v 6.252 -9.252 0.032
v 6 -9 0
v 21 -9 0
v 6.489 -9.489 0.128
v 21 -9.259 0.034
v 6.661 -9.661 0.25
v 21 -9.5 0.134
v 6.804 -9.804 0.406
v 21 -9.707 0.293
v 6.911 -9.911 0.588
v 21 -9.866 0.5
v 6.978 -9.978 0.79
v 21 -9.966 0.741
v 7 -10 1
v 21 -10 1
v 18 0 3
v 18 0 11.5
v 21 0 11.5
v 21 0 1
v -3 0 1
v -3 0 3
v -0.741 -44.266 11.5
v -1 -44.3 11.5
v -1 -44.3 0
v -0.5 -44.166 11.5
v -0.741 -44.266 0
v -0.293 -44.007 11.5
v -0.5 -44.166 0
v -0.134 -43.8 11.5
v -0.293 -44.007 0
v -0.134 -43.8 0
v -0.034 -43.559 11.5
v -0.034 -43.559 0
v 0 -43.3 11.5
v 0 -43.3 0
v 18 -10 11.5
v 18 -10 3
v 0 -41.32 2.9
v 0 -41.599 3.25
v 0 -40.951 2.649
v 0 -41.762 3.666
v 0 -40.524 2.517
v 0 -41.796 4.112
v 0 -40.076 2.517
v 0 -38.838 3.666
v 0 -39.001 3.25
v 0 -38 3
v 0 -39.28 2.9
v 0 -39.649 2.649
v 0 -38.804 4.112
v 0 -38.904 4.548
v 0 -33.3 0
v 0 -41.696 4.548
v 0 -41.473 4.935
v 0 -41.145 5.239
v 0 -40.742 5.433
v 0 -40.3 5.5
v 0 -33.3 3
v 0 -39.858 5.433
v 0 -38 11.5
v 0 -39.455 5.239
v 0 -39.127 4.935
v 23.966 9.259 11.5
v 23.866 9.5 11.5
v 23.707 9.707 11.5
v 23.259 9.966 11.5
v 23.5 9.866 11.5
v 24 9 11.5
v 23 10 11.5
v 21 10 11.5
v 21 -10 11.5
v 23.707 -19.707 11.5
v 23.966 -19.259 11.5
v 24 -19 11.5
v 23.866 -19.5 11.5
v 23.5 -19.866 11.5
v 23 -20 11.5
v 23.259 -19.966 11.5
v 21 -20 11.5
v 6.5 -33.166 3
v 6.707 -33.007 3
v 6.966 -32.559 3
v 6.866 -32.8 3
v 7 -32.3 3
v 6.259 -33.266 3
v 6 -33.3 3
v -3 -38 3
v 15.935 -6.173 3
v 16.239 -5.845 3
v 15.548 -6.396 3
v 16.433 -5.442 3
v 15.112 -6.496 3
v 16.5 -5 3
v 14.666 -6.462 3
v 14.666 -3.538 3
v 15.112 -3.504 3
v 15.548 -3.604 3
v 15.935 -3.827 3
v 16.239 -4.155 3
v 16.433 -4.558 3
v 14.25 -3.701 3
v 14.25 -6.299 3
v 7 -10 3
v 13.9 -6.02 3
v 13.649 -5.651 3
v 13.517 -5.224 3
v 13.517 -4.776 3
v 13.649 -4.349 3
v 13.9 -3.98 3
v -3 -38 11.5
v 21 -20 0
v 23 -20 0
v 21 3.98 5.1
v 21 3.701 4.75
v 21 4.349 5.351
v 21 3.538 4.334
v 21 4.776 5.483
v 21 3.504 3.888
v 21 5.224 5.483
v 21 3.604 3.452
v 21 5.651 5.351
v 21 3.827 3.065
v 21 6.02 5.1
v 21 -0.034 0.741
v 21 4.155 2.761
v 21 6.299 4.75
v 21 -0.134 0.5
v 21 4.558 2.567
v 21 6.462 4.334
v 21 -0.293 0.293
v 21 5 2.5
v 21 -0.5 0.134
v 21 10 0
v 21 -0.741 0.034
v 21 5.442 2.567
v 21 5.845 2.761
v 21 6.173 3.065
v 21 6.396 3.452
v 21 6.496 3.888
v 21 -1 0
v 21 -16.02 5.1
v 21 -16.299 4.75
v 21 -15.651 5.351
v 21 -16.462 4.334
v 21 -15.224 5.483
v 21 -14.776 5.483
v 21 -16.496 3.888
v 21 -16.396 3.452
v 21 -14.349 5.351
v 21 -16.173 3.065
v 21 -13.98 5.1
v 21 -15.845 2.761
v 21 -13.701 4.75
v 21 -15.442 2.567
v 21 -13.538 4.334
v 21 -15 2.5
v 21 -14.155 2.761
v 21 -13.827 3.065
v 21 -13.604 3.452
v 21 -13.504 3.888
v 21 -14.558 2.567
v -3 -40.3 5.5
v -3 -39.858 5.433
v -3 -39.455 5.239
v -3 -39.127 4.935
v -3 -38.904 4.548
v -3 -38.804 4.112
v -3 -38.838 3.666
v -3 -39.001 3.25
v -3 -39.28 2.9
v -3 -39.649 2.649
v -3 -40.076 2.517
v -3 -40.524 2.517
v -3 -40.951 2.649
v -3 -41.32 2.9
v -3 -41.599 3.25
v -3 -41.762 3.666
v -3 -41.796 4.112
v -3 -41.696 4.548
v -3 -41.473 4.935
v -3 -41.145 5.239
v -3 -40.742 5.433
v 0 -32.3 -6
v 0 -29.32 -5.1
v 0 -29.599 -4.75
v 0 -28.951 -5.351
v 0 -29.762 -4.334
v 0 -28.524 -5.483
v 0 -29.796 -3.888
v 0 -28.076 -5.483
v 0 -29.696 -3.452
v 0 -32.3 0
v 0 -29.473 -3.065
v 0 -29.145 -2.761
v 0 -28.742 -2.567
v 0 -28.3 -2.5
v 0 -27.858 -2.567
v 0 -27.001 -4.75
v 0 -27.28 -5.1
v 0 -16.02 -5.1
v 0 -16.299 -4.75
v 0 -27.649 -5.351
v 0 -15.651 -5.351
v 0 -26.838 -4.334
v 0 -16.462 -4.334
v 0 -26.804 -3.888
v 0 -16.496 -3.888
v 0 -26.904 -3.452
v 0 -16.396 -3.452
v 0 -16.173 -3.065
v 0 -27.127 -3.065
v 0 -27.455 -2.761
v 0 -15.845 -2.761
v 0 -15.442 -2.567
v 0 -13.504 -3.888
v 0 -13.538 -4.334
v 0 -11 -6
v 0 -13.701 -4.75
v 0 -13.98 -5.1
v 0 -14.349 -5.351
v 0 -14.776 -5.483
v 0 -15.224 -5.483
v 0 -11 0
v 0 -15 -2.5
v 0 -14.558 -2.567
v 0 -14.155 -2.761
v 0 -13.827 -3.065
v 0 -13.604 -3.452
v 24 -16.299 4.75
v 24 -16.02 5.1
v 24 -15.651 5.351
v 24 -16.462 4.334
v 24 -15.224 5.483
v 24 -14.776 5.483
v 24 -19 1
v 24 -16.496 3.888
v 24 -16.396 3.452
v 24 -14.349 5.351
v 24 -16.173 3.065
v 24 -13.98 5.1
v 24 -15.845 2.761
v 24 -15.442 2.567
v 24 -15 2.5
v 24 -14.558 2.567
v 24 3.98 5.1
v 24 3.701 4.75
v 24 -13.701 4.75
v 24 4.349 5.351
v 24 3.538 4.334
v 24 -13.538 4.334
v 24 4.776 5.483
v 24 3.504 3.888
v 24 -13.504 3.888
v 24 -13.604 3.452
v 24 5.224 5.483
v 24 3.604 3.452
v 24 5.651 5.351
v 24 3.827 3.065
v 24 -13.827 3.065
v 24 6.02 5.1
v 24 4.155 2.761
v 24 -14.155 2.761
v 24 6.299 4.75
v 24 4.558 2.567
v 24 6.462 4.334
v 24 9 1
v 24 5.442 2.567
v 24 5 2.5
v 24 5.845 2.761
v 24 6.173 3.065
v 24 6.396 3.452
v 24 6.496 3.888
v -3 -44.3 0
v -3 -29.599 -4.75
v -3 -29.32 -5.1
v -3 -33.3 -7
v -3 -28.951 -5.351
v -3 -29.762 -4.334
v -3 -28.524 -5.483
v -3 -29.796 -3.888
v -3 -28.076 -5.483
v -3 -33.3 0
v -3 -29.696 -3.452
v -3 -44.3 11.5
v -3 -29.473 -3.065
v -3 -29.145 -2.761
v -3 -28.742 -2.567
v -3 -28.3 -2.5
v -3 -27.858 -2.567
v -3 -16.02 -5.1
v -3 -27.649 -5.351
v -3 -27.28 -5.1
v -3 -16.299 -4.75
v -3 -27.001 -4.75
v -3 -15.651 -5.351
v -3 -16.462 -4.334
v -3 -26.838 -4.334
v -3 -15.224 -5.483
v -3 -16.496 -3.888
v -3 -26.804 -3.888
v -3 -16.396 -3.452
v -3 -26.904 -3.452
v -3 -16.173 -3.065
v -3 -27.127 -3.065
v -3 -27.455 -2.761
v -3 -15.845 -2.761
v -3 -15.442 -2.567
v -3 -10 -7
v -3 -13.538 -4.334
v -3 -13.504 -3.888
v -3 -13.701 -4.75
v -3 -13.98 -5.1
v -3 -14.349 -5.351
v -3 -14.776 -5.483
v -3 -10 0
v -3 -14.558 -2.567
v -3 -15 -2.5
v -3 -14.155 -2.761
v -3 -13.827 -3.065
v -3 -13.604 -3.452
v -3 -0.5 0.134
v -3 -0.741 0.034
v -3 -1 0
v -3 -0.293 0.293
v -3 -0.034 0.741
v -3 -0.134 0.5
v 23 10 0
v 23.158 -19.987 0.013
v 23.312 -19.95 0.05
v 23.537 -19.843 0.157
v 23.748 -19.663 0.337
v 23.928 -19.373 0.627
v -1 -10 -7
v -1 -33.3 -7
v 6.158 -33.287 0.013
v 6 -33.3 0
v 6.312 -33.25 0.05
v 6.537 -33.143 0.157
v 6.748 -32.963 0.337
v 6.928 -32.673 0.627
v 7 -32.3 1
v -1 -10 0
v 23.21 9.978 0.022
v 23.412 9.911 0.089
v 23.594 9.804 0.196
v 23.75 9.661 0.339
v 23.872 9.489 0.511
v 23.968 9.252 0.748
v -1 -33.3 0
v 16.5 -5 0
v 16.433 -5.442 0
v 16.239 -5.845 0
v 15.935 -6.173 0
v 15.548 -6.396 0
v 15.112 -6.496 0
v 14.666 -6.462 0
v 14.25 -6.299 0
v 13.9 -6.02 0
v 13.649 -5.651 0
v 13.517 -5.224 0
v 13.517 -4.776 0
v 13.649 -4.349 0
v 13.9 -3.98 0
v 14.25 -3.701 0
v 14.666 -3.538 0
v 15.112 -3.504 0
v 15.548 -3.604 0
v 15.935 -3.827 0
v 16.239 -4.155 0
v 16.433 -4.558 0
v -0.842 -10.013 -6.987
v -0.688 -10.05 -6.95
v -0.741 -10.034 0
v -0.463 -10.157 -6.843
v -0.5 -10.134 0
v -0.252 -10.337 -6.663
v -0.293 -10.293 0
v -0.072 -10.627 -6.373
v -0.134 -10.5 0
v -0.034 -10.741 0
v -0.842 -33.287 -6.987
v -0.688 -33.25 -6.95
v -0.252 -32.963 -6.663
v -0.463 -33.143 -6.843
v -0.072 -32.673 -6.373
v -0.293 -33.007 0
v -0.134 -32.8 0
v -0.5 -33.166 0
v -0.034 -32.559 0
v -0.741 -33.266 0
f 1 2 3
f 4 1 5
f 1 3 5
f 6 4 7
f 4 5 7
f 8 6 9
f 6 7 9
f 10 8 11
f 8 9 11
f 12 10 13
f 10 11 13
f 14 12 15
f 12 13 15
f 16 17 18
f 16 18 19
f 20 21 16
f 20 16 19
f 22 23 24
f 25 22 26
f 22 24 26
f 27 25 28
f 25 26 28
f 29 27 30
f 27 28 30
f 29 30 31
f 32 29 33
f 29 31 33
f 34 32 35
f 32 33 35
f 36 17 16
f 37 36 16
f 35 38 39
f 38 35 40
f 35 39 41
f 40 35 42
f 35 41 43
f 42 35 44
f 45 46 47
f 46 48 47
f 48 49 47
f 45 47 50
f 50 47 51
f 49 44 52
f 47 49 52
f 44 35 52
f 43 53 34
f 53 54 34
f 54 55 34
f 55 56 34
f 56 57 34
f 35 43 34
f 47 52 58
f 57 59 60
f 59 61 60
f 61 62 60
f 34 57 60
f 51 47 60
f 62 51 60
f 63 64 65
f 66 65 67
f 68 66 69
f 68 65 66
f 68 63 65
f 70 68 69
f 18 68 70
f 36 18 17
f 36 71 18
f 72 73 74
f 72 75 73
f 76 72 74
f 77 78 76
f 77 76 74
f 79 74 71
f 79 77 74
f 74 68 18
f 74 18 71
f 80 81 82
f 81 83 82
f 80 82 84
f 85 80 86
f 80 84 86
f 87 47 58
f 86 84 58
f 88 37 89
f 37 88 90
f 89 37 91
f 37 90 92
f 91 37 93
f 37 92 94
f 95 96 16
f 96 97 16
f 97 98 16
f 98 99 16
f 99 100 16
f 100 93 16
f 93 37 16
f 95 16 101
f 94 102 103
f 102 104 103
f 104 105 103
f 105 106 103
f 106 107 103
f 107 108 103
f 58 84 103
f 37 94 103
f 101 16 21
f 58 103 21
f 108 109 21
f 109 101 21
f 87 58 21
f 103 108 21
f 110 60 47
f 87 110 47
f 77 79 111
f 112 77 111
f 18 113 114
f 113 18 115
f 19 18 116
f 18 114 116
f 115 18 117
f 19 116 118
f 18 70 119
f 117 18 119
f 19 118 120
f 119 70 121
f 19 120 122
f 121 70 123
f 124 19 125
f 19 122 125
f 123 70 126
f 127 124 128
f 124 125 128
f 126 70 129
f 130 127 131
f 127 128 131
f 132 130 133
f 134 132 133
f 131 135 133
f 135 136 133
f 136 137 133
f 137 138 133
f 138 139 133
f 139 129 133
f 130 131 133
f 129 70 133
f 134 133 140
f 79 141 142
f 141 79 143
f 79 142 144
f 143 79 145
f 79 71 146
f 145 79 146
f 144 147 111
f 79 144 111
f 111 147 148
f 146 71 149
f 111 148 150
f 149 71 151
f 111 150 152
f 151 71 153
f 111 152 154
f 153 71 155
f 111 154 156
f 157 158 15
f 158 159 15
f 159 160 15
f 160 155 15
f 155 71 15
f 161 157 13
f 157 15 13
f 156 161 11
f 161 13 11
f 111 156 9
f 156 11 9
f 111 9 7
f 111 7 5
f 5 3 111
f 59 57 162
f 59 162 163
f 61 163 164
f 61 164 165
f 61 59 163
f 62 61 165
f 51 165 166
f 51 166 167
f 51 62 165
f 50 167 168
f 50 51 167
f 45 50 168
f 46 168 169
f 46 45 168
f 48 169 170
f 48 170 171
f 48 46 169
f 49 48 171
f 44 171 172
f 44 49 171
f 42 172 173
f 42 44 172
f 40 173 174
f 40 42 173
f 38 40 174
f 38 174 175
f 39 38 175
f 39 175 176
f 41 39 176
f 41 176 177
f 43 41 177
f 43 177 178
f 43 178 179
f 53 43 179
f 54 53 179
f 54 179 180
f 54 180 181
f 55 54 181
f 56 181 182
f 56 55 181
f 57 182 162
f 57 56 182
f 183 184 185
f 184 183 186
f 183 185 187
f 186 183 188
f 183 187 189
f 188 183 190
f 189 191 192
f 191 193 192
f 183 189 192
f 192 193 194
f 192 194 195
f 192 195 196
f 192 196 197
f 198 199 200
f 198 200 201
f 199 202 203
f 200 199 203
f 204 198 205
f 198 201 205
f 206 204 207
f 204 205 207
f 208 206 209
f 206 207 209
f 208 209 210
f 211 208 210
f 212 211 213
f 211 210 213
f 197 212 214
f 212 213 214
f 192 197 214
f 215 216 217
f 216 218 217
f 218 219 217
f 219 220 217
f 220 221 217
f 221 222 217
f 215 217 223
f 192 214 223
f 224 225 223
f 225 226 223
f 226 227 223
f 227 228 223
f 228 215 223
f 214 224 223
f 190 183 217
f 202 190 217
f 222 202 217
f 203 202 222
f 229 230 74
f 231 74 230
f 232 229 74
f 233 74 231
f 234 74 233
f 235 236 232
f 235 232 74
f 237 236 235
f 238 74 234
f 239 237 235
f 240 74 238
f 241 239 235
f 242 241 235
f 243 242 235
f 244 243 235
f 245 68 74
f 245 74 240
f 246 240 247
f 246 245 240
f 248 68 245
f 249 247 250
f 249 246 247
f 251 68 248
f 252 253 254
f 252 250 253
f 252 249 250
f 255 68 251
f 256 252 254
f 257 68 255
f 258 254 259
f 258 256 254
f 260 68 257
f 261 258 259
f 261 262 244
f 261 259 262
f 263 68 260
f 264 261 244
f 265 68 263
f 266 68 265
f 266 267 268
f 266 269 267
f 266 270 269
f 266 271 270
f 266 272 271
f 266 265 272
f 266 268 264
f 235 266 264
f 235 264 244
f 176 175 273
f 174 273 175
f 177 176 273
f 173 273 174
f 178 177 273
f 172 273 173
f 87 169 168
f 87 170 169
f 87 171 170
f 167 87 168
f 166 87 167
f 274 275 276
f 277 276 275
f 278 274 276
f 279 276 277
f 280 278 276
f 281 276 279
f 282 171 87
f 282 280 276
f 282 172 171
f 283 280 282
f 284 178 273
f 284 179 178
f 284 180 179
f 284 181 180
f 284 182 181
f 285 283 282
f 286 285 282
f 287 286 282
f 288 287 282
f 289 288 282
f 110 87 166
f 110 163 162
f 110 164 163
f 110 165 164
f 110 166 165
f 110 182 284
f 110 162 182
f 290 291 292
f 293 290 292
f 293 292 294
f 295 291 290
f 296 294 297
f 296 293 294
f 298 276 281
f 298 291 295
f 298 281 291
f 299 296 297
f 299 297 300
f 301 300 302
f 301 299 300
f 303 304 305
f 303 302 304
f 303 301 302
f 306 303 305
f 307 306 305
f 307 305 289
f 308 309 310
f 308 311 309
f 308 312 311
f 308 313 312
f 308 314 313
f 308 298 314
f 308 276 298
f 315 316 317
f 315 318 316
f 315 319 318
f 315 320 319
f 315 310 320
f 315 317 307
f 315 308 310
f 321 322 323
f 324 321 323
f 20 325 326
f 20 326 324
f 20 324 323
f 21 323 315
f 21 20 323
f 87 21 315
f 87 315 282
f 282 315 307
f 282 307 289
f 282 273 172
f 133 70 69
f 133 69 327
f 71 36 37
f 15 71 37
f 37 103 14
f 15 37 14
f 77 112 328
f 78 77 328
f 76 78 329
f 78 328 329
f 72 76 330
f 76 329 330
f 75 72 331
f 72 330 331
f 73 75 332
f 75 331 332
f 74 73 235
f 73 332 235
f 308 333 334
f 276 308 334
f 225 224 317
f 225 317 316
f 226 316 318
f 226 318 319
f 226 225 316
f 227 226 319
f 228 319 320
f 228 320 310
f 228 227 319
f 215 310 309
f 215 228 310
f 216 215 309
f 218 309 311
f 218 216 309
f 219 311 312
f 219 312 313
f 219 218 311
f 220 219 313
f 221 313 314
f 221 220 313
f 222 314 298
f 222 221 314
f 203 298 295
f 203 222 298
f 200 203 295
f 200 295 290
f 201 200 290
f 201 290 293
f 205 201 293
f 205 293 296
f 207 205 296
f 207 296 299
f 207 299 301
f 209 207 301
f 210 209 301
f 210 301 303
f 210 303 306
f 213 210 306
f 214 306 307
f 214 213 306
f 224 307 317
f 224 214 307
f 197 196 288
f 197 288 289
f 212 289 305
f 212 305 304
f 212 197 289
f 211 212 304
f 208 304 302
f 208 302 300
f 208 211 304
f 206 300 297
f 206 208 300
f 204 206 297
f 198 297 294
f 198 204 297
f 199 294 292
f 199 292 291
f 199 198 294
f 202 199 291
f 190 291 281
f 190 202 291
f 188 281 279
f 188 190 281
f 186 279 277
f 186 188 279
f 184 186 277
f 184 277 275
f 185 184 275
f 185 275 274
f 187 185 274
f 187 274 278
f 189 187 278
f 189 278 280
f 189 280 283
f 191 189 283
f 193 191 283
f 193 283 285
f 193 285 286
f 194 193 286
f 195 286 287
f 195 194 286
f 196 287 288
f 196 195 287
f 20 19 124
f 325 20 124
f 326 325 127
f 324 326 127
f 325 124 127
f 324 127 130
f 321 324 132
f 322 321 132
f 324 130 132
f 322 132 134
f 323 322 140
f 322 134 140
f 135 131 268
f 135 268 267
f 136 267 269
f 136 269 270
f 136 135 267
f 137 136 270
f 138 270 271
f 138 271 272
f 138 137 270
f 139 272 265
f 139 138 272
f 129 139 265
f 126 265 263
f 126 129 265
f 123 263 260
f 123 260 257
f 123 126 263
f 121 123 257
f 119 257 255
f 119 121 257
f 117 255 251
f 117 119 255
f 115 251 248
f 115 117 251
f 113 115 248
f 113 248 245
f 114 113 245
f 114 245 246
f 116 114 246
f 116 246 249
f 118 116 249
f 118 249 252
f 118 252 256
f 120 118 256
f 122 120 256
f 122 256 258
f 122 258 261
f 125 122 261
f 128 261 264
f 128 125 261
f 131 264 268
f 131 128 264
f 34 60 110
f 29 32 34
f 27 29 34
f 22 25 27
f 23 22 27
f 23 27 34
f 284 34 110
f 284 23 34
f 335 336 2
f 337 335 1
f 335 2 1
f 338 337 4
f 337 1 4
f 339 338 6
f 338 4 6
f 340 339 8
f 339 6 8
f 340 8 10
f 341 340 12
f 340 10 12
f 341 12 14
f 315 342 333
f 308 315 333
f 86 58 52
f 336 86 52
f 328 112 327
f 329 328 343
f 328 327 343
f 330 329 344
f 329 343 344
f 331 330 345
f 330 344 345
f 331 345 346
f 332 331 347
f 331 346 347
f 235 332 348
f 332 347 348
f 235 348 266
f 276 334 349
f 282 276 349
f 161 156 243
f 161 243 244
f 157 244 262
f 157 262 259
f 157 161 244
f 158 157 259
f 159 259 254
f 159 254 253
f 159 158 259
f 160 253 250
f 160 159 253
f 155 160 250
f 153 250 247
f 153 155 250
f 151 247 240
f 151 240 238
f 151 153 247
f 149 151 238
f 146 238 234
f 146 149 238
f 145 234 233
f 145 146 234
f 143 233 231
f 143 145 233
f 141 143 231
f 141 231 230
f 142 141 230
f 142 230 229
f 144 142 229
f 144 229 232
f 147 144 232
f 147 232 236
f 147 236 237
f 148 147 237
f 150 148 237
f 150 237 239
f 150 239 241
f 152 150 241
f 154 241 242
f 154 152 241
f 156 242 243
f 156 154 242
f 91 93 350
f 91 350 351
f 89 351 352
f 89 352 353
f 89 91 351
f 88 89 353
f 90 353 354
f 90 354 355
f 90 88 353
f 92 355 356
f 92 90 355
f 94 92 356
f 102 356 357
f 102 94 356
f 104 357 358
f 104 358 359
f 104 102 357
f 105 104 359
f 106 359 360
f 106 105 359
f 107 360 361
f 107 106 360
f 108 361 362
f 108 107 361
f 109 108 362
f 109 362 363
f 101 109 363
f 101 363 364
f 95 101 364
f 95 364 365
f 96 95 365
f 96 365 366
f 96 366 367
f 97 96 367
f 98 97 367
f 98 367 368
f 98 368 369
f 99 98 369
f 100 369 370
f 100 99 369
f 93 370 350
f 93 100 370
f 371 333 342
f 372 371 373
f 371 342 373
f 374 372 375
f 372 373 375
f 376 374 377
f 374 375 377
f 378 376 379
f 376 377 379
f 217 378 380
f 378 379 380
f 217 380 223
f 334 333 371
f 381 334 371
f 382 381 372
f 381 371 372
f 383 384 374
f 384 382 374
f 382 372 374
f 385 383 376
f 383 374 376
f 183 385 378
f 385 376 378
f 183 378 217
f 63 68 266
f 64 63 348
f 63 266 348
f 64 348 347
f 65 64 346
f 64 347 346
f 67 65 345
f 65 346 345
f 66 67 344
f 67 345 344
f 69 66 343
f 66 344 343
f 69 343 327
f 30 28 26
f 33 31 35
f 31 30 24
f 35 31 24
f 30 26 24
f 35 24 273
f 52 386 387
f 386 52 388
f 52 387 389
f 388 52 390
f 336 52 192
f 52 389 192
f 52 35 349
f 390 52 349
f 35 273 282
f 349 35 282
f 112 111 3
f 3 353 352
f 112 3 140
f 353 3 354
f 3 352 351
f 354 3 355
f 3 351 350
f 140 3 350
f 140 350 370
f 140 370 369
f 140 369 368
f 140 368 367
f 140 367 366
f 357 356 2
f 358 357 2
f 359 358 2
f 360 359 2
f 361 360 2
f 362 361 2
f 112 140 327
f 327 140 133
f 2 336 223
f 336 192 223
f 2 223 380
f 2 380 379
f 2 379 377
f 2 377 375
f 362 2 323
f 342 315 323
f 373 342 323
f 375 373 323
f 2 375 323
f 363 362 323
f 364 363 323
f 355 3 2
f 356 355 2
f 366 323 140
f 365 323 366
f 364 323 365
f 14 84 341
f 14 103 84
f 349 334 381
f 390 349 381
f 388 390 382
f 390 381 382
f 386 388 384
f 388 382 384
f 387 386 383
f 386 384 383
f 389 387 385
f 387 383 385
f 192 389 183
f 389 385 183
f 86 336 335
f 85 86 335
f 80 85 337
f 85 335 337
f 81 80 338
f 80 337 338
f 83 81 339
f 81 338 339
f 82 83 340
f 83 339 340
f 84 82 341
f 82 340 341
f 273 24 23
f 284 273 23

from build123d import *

# Parameters (mm, degrees)
CROQUIS1_W              = 23
CROQUIS1_H              = 33.3
SALIENTE_EXTRUIR2_DEPTH = 7
CROQUIS3_W              = 4
CROQUIS3_H              = 19
CORTAR_EXTRUIR1_DEPTH   = 42.071766458
CROQUIS7_R              = 1.5
SALIENTE_EXTRUIR3_DEPTH = 3
CROQUIS8_W              = 18
CROQUIS8_H              = 10
CROQUIS8_R              = 1.5
SALIENTE_EXTRUIR5_DEPTH = 1
SALIENTE_EXTRUIR6_START = -3
CROQUIS9_W              = 18
CROQUIS9_H              = 10
CROQUIS9_R              = 1.5
SALIENTE_EXTRUIR6_DEPTH = 3
CROQUIS10_W             = 23
CROQUIS10_H             = 10
SALIENTE_EXTRUIR7_DEPTH = 3
CROQUIS11_W             = 19
CROQUIS11_H             = 38
CORTAR_EXTRUIR5_DEPTH   = 57.449003534
CROQUIS14_W             = 7
CROQUIS14_H             = 16
CORTAR_EXTRUIR7_DEPTH   = 1
CROQUIS15_W             = 7
CROQUIS15_H             = 10
CORTAR_EXTRUIR8_DEPTH   = 58.475994989
CROQUIS17_W             = 23
CROQUIS17_H             = 10
CROQUIS17_R             = 1.5
SALIENTE_EXTRUIR8_DEPTH = 3
REDONDEO2_R             = 1
CROQUIS18_W             = 27
CROQUIS18_H             = 18.5
CORTAR_EXTRUIR10_DEPTH  = 67.516839973


with BuildPart() as part:
    # Croquis1 → Saliente-Extruir2 (new body)
    with BuildSketch(Plane(origin=(0, 0, 0), x_dir=(0, 0, -1), z_dir=(1, 0, 0))):
        with Locations((-11.5, -16.65)):
            Rectangle(CROQUIS1_W, CROQUIS1_H)
    extrude(amount=SALIENTE_EXTRUIR2_DEPTH)

    # Croquis3 → Cortar-Extruir1 (cut, through all)
    with BuildSketch(Plane(origin=(0, 0, 0), x_dir=(1, 0, 0), z_dir=(0, 1, 0))):
        with Locations((5, -12.5)):
            Rectangle(CROQUIS3_W, CROQUIS3_H)
    extrude(amount=-CORTAR_EXTRUIR1_DEPTH, mode=Mode.SUBTRACT)



with BuildPart() as body_2:
    # Croquis7 → Saliente-Extruir3 (new body)
    with BuildSketch(Plane.ZY):
        Polygon((-7, 0), (-7, -33.3), (0, -33.3), (0, -44.3), (23, -44.3), (23, -33.3), (30, -33.3), (30, 0), align=None)
        with Locations((-4, -28.3)):
            Circle(CROQUIS7_R, mode=Mode.SUBTRACT)
        with Locations((-4, -15)):
            Circle(CROQUIS7_R, mode=Mode.SUBTRACT)
        with Locations((27, -15)):
            Circle(CROQUIS7_R, mode=Mode.SUBTRACT)
        with Locations((27, -28.3)):
            Circle(CROQUIS7_R, mode=Mode.SUBTRACT)
        with Locations((19, -40.3)):
            Circle(CROQUIS7_R, mode=Mode.SUBTRACT)
        with Locations((4, -40.3)):
            Circle(CROQUIS7_R, mode=Mode.SUBTRACT)
    extrude(amount=SALIENTE_EXTRUIR3_DEPTH)


with BuildPart() as part_1:
    add(part.part)

    add(body_2.part)  # Saliente-Extruir5 merges body 2
    # Croquis8 → Saliente-Extruir5 (add)
    with BuildSketch(Plane.XY.offset(23)):
        with Locations((9, -5)):
            Rectangle(CROQUIS8_W, CROQUIS8_H)
        with Locations((15, -5)):
            Circle(CROQUIS8_R, mode=Mode.SUBTRACT)
        with Locations((3, -5)):
            Circle(CROQUIS8_R, mode=Mode.SUBTRACT)
    extrude(amount=-SALIENTE_EXTRUIR5_DEPTH)

    # Croquis9 → Saliente-Extruir6 (add)
    with BuildSketch(Plane(origin=(0, 0, 0), x_dir=(-1, 0, 0), z_dir=(0, 0, -1)).offset(SALIENTE_EXTRUIR6_START)):
        with Locations((-9, -5)):
            Rectangle(CROQUIS9_W, CROQUIS9_H)
        with Locations(Location((-15, -5, 0), (0, 0, 180))):
            Circle(CROQUIS9_R, mode=Mode.SUBTRACT)
    extrude(amount=SALIENTE_EXTRUIR6_DEPTH)

    # Croquis10 → Saliente-Extruir7 (add)
    with BuildSketch(Plane(origin=(18, 0, 0), x_dir=(0, 0, -1), z_dir=(1, 0, 0))):
        with Locations((-11.5, -5)):
            Rectangle(CROQUIS10_W, CROQUIS10_H)
    extrude(amount=SALIENTE_EXTRUIR7_DEPTH)

    # Croquis11 → Cortar-Extruir5 (cut, through all)
    with BuildSketch(Plane(origin=(3, 0, 0), x_dir=(0, 0, -1), z_dir=(1, 0, 0))):
        with Locations((-12.5, -19)):
            Rectangle(CROQUIS11_W, CROQUIS11_H)
    extrude(amount=-CORTAR_EXTRUIR5_DEPTH, mode=Mode.SUBTRACT)

    # Croquis14 → Cortar-Extruir7 (cut)
    with BuildSketch(Plane.XY.offset(23)):
        with Locations((3.5, -25.3)):
            Rectangle(CROQUIS14_W, CROQUIS14_H)
    extrude(amount=-CORTAR_EXTRUIR7_DEPTH, mode=Mode.SUBTRACT)

    # Croquis15 → Cortar-Extruir8 (cut, through all)
    with BuildSketch(Plane(origin=(0, 0, 0), x_dir=(0, 0, -1), z_dir=(1, 0, 0))):
        with Locations((-26.5, -5)):
            Rectangle(CROQUIS15_W, CROQUIS15_H)
        with Locations((3.5, -5)):
            Rectangle(CROQUIS15_W, CROQUIS15_H)
    extrude(amount=-CORTAR_EXTRUIR8_DEPTH, mode=Mode.SUBTRACT)

    # Croquis17 → Saliente-Extruir8 (add)
    # profile 1 of 3: a face of its own
    with BuildSketch(Plane(origin=(21, 0, 0), x_dir=(0, 0, -1), z_dir=(1, 0, 0))):
        with Locations((-11.5, -15)):
            Rectangle(CROQUIS17_W, CROQUIS17_H)
        with Locations((-4, -15)):
            Circle(CROQUIS17_R, mode=Mode.SUBTRACT)
        with Locations((-19, -15)):
            Circle(CROQUIS17_R, mode=Mode.SUBTRACT)
    # profile 2 of 3: a face of its own
    with BuildSketch(Plane(origin=(21, 0, 0), x_dir=(0, 0, -1), z_dir=(1, 0, 0))):
        with Locations((-11.5, -5)):
            Rectangle(CROQUIS17_W, CROQUIS17_H)
    # profile 3 of 3: a face of its own
    with BuildSketch(Plane(origin=(21, 0, 0), x_dir=(0, 0, -1), z_dir=(1, 0, 0))):
        with Locations((-11.5, 5)):
            Rectangle(CROQUIS17_W, CROQUIS17_H)
        with Locations((-19, 5)):
            Circle(CROQUIS17_R, mode=Mode.SUBTRACT)
        with Locations((-4, 5)):
            Circle(CROQUIS17_R, mode=Mode.SUBTRACT)
    extrude(amount=SALIENTE_EXTRUIR8_DEPTH)

    # Redondeo2
    # the kernel refuses this fillet: 1 mm, written as the material it takes off along each edge
    with BuildSketch(Plane(origin=(0, -44.3, 23), x_dir=(0, 0, -1), z_dir=(0, 1, 0))) as redondeo2_piece_1:
        with BuildLine():
            CenterArc((REDONDEO2_R, REDONDEO2_R), REDONDEO2_R, 180, 90)
            Line((0, REDONDEO2_R), (-REDONDEO2_R * 0.02, REDONDEO2_R))
            Line((-REDONDEO2_R * 0.02, REDONDEO2_R), (-REDONDEO2_R * 0.02, -REDONDEO2_R * 0.02))
            Line((-REDONDEO2_R * 0.02, -REDONDEO2_R * 0.02), (REDONDEO2_R, -REDONDEO2_R * 0.02))
            Line((REDONDEO2_R, -REDONDEO2_R * 0.02), (REDONDEO2_R, 0))
        make_face()
    extrude(amount=11, mode=Mode.SUBTRACT)
    with BuildSketch(Plane(origin=(0, -44.3, 0), x_dir=(0, 1, 0), z_dir=(0, 0, 1)), Plane(origin=(24, 10, 0), x_dir=(-1, 0, 0), z_dir=(0, 0, 1))) as redondeo2_piece_2:
        with BuildLine():
            CenterArc((REDONDEO2_R, REDONDEO2_R), REDONDEO2_R, 180, 90)
            Line((0, REDONDEO2_R), (-REDONDEO2_R * 0.02, REDONDEO2_R))
            Line((-REDONDEO2_R * 0.02, REDONDEO2_R), (-REDONDEO2_R * 0.02, -REDONDEO2_R * 0.02))
            Line((-REDONDEO2_R * 0.02, -REDONDEO2_R * 0.02), (REDONDEO2_R, -REDONDEO2_R * 0.02))
            Line((REDONDEO2_R, -REDONDEO2_R * 0.02), (REDONDEO2_R, 0))
        make_face()
    extrude(amount=23, mode=Mode.SUBTRACT)
    with BuildSketch(Plane(origin=(0, -10, 23), x_dir=(0, -1, 0), z_dir=(0, 0, 1)), Plane(origin=(0, -10, 0), x_dir=(-1, 0, 0), z_dir=(0, 0, -1))) as redondeo2_piece_3:
        with BuildLine():
            CenterArc((REDONDEO2_R, -REDONDEO2_R), REDONDEO2_R, 90, 90)
            Line((0, -REDONDEO2_R), (-REDONDEO2_R * 0.02, -REDONDEO2_R))
            Line((-REDONDEO2_R * 0.02, -REDONDEO2_R), (-REDONDEO2_R * 0.02, REDONDEO2_R * 0.02))
            Line((-REDONDEO2_R * 0.02, REDONDEO2_R * 0.02), (REDONDEO2_R, REDONDEO2_R * 0.02))
            Line((REDONDEO2_R, REDONDEO2_R * 0.02), (REDONDEO2_R, 0))
        make_face()
    extrude(amount=7, mode=Mode.SUBTRACT)
    with BuildSketch(Plane(origin=(0, -33.3, 23), x_dir=(0, 1, 0), z_dir=(0, 0, 1)), Plane(origin=(0, -33.3, -7), x_dir=(0, 1, 0), z_dir=(0, 0, 1))) as redondeo2_piece_4:
        with BuildLine():
            CenterArc((REDONDEO2_R, REDONDEO2_R), REDONDEO2_R, 180, 90)
            Line((0, REDONDEO2_R), (-REDONDEO2_R * 0.02, REDONDEO2_R))
            Line((-REDONDEO2_R * 0.02, REDONDEO2_R), (-REDONDEO2_R * 0.02, -REDONDEO2_R * 0.02))
            Line((-REDONDEO2_R * 0.02, -REDONDEO2_R * 0.02), (REDONDEO2_R, -REDONDEO2_R * 0.02))
            Line((REDONDEO2_R, -REDONDEO2_R * 0.02), (REDONDEO2_R, 0))
        make_face()
    extrude(amount=7, mode=Mode.SUBTRACT)
    with BuildSketch(Plane(origin=(0, -33.3, 30), x_dir=(0, 0, -1), z_dir=(0, 1, 0)), Plane(origin=(0, -10, -7), x_dir=(0, 0, 1), z_dir=(0, -1, 0))) as redondeo2_piece_5:
        with BuildLine():
            CenterArc((REDONDEO2_R, REDONDEO2_R), REDONDEO2_R, 180, 90)
            Line((0, REDONDEO2_R), (-REDONDEO2_R * 0.02, REDONDEO2_R))
            Line((-REDONDEO2_R * 0.02, REDONDEO2_R), (-REDONDEO2_R * 0.02, -REDONDEO2_R * 0.02))
            Line((-REDONDEO2_R * 0.02, -REDONDEO2_R * 0.02), (REDONDEO2_R, -REDONDEO2_R * 0.02))
            Line((REDONDEO2_R, -REDONDEO2_R * 0.02), (REDONDEO2_R, 0))
        make_face()
    extrude(amount=23.3, mode=Mode.SUBTRACT)
    with BuildSketch(Plane(origin=(7, -33.3, 0), x_dir=(-1, 0, 0), z_dir=(0, 0, 1))) as redondeo2_piece_6:
        with BuildLine():
            CenterArc((REDONDEO2_R, -REDONDEO2_R), REDONDEO2_R, 90, 90)
            Line((0, -REDONDEO2_R), (-REDONDEO2_R * 0.02, -REDONDEO2_R))
            Line((-REDONDEO2_R * 0.02, -REDONDEO2_R), (-REDONDEO2_R * 0.02, REDONDEO2_R * 0.02))
            Line((-REDONDEO2_R * 0.02, REDONDEO2_R * 0.02), (REDONDEO2_R, REDONDEO2_R * 0.02))
            Line((REDONDEO2_R, REDONDEO2_R * 0.02), (REDONDEO2_R, 0))
        make_face()
    extrude(amount=3, mode=Mode.SUBTRACT)
    with BuildSketch(Plane(origin=(7, -10, 0), x_dir=(-1, 0, 0), z_dir=(0, -1, 0))) as redondeo2_piece_7:
        with BuildLine():
            CenterArc((REDONDEO2_R, -REDONDEO2_R), REDONDEO2_R, 90, 90)
            Line((0, -REDONDEO2_R), (-REDONDEO2_R * 0.02, -REDONDEO2_R))
            Line((-REDONDEO2_R * 0.02, -REDONDEO2_R), (-REDONDEO2_R * 0.02, REDONDEO2_R * 0.02))
            Line((-REDONDEO2_R * 0.02, REDONDEO2_R * 0.02), (REDONDEO2_R, REDONDEO2_R * 0.02))
            Line((REDONDEO2_R, REDONDEO2_R * 0.02), (REDONDEO2_R, 0))
        make_face()
    extrude(amount=23.3, mode=Mode.SUBTRACT)
    with BuildSketch(Plane(origin=(21, -10, 0), x_dir=(0, 1, 0), z_dir=(-1, 0, 0))) as redondeo2_piece_8:
        with BuildLine():
            CenterArc((REDONDEO2_R, -REDONDEO2_R), REDONDEO2_R, 90, 90)
            Line((0, -REDONDEO2_R), (-REDONDEO2_R * 0.02, -REDONDEO2_R))
            Line((-REDONDEO2_R * 0.02, -REDONDEO2_R), (-REDONDEO2_R * 0.02, REDONDEO2_R * 0.02))
            Line((-REDONDEO2_R * 0.02, REDONDEO2_R * 0.02), (REDONDEO2_R, REDONDEO2_R * 0.02))
            Line((REDONDEO2_R, REDONDEO2_R * 0.02), (REDONDEO2_R, 0))
        make_face()
    extrude(amount=14, mode=Mode.SUBTRACT)
    with BuildSketch(Plane(origin=(21, 0, 0), x_dir=(0, -1, 0), z_dir=(-1, 0, 0))) as redondeo2_piece_9:
        with BuildLine():
            CenterArc((REDONDEO2_R, REDONDEO2_R), REDONDEO2_R, 180, 90)
            Line((0, REDONDEO2_R), (-REDONDEO2_R * 0.02, REDONDEO2_R))
            Line((-REDONDEO2_R * 0.02, REDONDEO2_R), (-REDONDEO2_R * 0.02, -REDONDEO2_R * 0.02))
            Line((-REDONDEO2_R * 0.02, -REDONDEO2_R * 0.02), (REDONDEO2_R, -REDONDEO2_R * 0.02))
            Line((REDONDEO2_R, -REDONDEO2_R * 0.02), (REDONDEO2_R, 0))
        make_face()
    extrude(amount=24, mode=Mode.SUBTRACT)
    with BuildSketch(Plane(origin=(24, 10, 0), x_dir=(-1, 0, 0), z_dir=(0, -1, 0)), Plane(origin=(24, 10, 23), x_dir=(0, 0, -1), z_dir=(0, -1, 0))) as redondeo2_piece_10:
        with BuildLine():
            CenterArc((REDONDEO2_R, -REDONDEO2_R), REDONDEO2_R, 90, 90)
            Line((0, -REDONDEO2_R), (-REDONDEO2_R * 0.02, -REDONDEO2_R))
            Line((-REDONDEO2_R * 0.02, -REDONDEO2_R), (-REDONDEO2_R * 0.02, REDONDEO2_R * 0.02))
            Line((-REDONDEO2_R * 0.02, REDONDEO2_R * 0.02), (REDONDEO2_R, REDONDEO2_R * 0.02))
            Line((REDONDEO2_R, REDONDEO2_R * 0.02), (REDONDEO2_R, 0))
        make_face()
    extrude(amount=30, mode=Mode.SUBTRACT)
    with BuildSketch(Plane(origin=(24, -20, 0), x_dir=(-1, 0, 0), z_dir=(0, 0, 1))) as redondeo2_piece_11:
        with BuildLine():
            CenterArc((REDONDEO2_R, -REDONDEO2_R), REDONDEO2_R, 90, 90)
            Line((0, -REDONDEO2_R), (-REDONDEO2_R * 0.02, -REDONDEO2_R))
            Line((-REDONDEO2_R * 0.02, -REDONDEO2_R), (-REDONDEO2_R * 0.02, REDONDEO2_R * 0.02))
            Line((-REDONDEO2_R * 0.02, REDONDEO2_R * 0.02), (REDONDEO2_R, REDONDEO2_R * 0.02))
            Line((REDONDEO2_R, REDONDEO2_R * 0.02), (REDONDEO2_R, 0))
        make_face()
    extrude(amount=23, mode=Mode.SUBTRACT)
    with BuildSketch(Plane(origin=(0, -46.8, 23), x_dir=(0, 0, -1), z_dir=(0, 1, 0))) as redondeo2_piece_12a_section:
        with BuildLine():
            CenterArc((REDONDEO2_R, REDONDEO2_R), REDONDEO2_R, 180, 90)
            Line((0, REDONDEO2_R), (-REDONDEO2_R * 0.02, REDONDEO2_R))
            Line((-REDONDEO2_R * 0.02, REDONDEO2_R), (-REDONDEO2_R * 0.02, -REDONDEO2_R * 0.02))
            Line((-REDONDEO2_R * 0.02, -REDONDEO2_R * 0.02), (REDONDEO2_R, -REDONDEO2_R * 0.02))
            Line((REDONDEO2_R, -REDONDEO2_R * 0.02), (REDONDEO2_R, 0))
        make_face()
    redondeo2_piece_12a = extrude(amount=13.5, mode=Mode.PRIVATE)
    redondeo2_piece_12a = split(redondeo2_piece_12a, bisect_by=Plane(origin=(-0.226395114, -44.3, 22.773604886), z_dir=(0, -1, 0)), keep=Keep.TOP, mode=Mode.PRIVATE)
    with BuildSketch(Plane(origin=(0, -44.3, 0), x_dir=(0, 1, 0), z_dir=(0, 0, 1))) as redondeo2_piece_12b_section:
        with BuildLine():
            CenterArc((REDONDEO2_R, REDONDEO2_R), REDONDEO2_R, 180, 90)
            Line((0, REDONDEO2_R), (-REDONDEO2_R * 0.02, REDONDEO2_R))
            Line((-REDONDEO2_R * 0.02, REDONDEO2_R), (-REDONDEO2_R * 0.02, -REDONDEO2_R * 0.02))
            Line((-REDONDEO2_R * 0.02, -REDONDEO2_R * 0.02), (REDONDEO2_R, -REDONDEO2_R * 0.02))
            Line((REDONDEO2_R, -REDONDEO2_R * 0.02), (REDONDEO2_R, 0))
        make_face()
    redondeo2_piece_12b = extrude(amount=25.5, mode=Mode.PRIVATE)
    redondeo2_piece_12b = split(redondeo2_piece_12b, bisect_by=Plane(origin=(-0.226395114, -44.073604886, 23), z_dir=(0, 0, 1)), keep=Keep.TOP, mode=Mode.PRIVATE)
    redondeo2_piece_12 = redondeo2_piece_12a & redondeo2_piece_12b
    add(redondeo2_piece_12, mode=Mode.SUBTRACT)
    with BuildSketch(Plane(origin=(0, -33.3, 20.5), x_dir=(0, 1, 0), z_dir=(0, 0, 1))) as redondeo2_piece_13a_section:
        with BuildLine():
            CenterArc((REDONDEO2_R, REDONDEO2_R), REDONDEO2_R, 180, 90)
            Line((0, REDONDEO2_R), (-REDONDEO2_R * 0.02, REDONDEO2_R))
            Line((-REDONDEO2_R * 0.02, REDONDEO2_R), (-REDONDEO2_R * 0.02, -REDONDEO2_R * 0.02))
            Line((-REDONDEO2_R * 0.02, -REDONDEO2_R * 0.02), (REDONDEO2_R, -REDONDEO2_R * 0.02))
            Line((REDONDEO2_R, -REDONDEO2_R * 0.02), (REDONDEO2_R, 0))
        make_face()
    redondeo2_piece_13a = extrude(amount=9.5, mode=Mode.PRIVATE)
    redondeo2_piece_13a = split(redondeo2_piece_13a, bisect_by=Plane(origin=(-0.226395114, -33.073604886, 23), z_dir=(0, 0, -1)), keep=Keep.TOP, mode=Mode.PRIVATE)
    with BuildSketch(Plane(origin=(0, -44.3, 23), x_dir=(0, 0, -1), z_dir=(0, 1, 0))) as redondeo2_piece_13b_section:
        with BuildLine():
            CenterArc((REDONDEO2_R, REDONDEO2_R), REDONDEO2_R, 180, 90)
            Line((0, REDONDEO2_R), (-REDONDEO2_R * 0.02, REDONDEO2_R))
            Line((-REDONDEO2_R * 0.02, REDONDEO2_R), (-REDONDEO2_R * 0.02, -REDONDEO2_R * 0.02))
            Line((-REDONDEO2_R * 0.02, -REDONDEO2_R * 0.02), (REDONDEO2_R, -REDONDEO2_R * 0.02))
            Line((REDONDEO2_R, -REDONDEO2_R * 0.02), (REDONDEO2_R, 0))
        make_face()
    redondeo2_piece_13b = extrude(amount=13.5, mode=Mode.PRIVATE)
    redondeo2_piece_13b = split(redondeo2_piece_13b, bisect_by=Plane(origin=(-0.226395114, -33.3, 22.773604886), z_dir=(0, 1, 0)), keep=Keep.TOP, mode=Mode.PRIVATE)
    redondeo2_piece_13 = redondeo2_piece_13a & redondeo2_piece_13b
    add(redondeo2_piece_13, mode=Mode.SUBTRACT)
    with BuildSketch(Plane(origin=(0, -10, 23), x_dir=(0, -1, 0), z_dir=(0, 0, 1))) as redondeo2_piece_14a_section:
        with BuildLine():
            CenterArc((REDONDEO2_R, -REDONDEO2_R), REDONDEO2_R, 90, 90)
            Line((0, -REDONDEO2_R), (-REDONDEO2_R * 0.02, -REDONDEO2_R))
            Line((-REDONDEO2_R * 0.02, -REDONDEO2_R), (-REDONDEO2_R * 0.02, REDONDEO2_R * 0.02))
            Line((-REDONDEO2_R * 0.02, REDONDEO2_R * 0.02), (REDONDEO2_R, REDONDEO2_R * 0.02))
            Line((REDONDEO2_R, REDONDEO2_R * 0.02), (REDONDEO2_R, 0))
        make_face()
    redondeo2_piece_14a = extrude(amount=9.5, mode=Mode.PRIVATE)
    redondeo2_piece_14a = split(redondeo2_piece_14a, bisect_by=Plane(origin=(-0.226395114, -10.226395114, 30), z_dir=(0, 0, 1)), keep=Keep.TOP, mode=Mode.PRIVATE)
    with BuildSketch(Plane(origin=(0, -33.3, 30), x_dir=(0, 0, -1), z_dir=(0, 1, 0))) as redondeo2_piece_14b_section:
        with BuildLine():
            CenterArc((REDONDEO2_R, REDONDEO2_R), REDONDEO2_R, 180, 90)
            Line((0, REDONDEO2_R), (-REDONDEO2_R * 0.02, REDONDEO2_R))
            Line((-REDONDEO2_R * 0.02, REDONDEO2_R), (-REDONDEO2_R * 0.02, -REDONDEO2_R * 0.02))
            Line((-REDONDEO2_R * 0.02, -REDONDEO2_R * 0.02), (REDONDEO2_R, -REDONDEO2_R * 0.02))
            Line((REDONDEO2_R, -REDONDEO2_R * 0.02), (REDONDEO2_R, 0))
        make_face()
    redondeo2_piece_14b = extrude(amount=25.8, mode=Mode.PRIVATE)
    redondeo2_piece_14b = split(redondeo2_piece_14b, bisect_by=Plane(origin=(-0.226395114, -10, 29.773604886), z_dir=(0, 1, 0)), keep=Keep.TOP, mode=Mode.PRIVATE)
    redondeo2_piece_14 = redondeo2_piece_14a & redondeo2_piece_14b
    add(redondeo2_piece_14, mode=Mode.SUBTRACT)
    with BuildSketch(Plane(origin=(0, -33.3, 23), x_dir=(0, 1, 0), z_dir=(0, 0, 1))) as redondeo2_piece_15a_section:
        with BuildLine():
            CenterArc((REDONDEO2_R, REDONDEO2_R), REDONDEO2_R, 180, 90)
            Line((0, REDONDEO2_R), (-REDONDEO2_R * 0.02, REDONDEO2_R))
            Line((-REDONDEO2_R * 0.02, REDONDEO2_R), (-REDONDEO2_R * 0.02, -REDONDEO2_R * 0.02))
            Line((-REDONDEO2_R * 0.02, -REDONDEO2_R * 0.02), (REDONDEO2_R, -REDONDEO2_R * 0.02))
            Line((REDONDEO2_R, -REDONDEO2_R * 0.02), (REDONDEO2_R, 0))
        make_face()
    redondeo2_piece_15a = extrude(amount=9.5, mode=Mode.PRIVATE)
    redondeo2_piece_15a = split(redondeo2_piece_15a, bisect_by=Plane(origin=(-0.226395114, -33.073604886, 30), z_dir=(0, 0, 1)), keep=Keep.TOP, mode=Mode.PRIVATE)
    with BuildSketch(Plane(origin=(0, -35.8, 30), x_dir=(0, 0, -1), z_dir=(0, 1, 0))) as redondeo2_piece_15b_section:
        with BuildLine():
            CenterArc((REDONDEO2_R, REDONDEO2_R), REDONDEO2_R, 180, 90)
            Line((0, REDONDEO2_R), (-REDONDEO2_R * 0.02, REDONDEO2_R))
            Line((-REDONDEO2_R * 0.02, REDONDEO2_R), (-REDONDEO2_R * 0.02, -REDONDEO2_R * 0.02))
            Line((-REDONDEO2_R * 0.02, -REDONDEO2_R * 0.02), (REDONDEO2_R, -REDONDEO2_R * 0.02))
            Line((REDONDEO2_R, -REDONDEO2_R * 0.02), (REDONDEO2_R, 0))
        make_face()
    redondeo2_piece_15b = extrude(amount=25.8, mode=Mode.PRIVATE)
    redondeo2_piece_15b = split(redondeo2_piece_15b, bisect_by=Plane(origin=(-0.226395114, -33.3, 29.773604886), z_dir=(0, -1, 0)), keep=Keep.TOP, mode=Mode.PRIVATE)
    redondeo2_piece_15 = redondeo2_piece_15a & redondeo2_piece_15b
    add(redondeo2_piece_15, mode=Mode.SUBTRACT)
    with BuildSketch(Plane(origin=(7, -10, 0), x_dir=(-1, 0, 0), z_dir=(0, -1, 0))) as redondeo2_piece_16a_section:
        with BuildLine():
            CenterArc((REDONDEO2_R, -REDONDEO2_R), REDONDEO2_R, 90, 90)
            Line((0, -REDONDEO2_R), (-REDONDEO2_R * 0.02, -REDONDEO2_R))
            Line((-REDONDEO2_R * 0.02, -REDONDEO2_R), (-REDONDEO2_R * 0.02, REDONDEO2_R * 0.02))
            Line((-REDONDEO2_R * 0.02, REDONDEO2_R * 0.02), (REDONDEO2_R, REDONDEO2_R * 0.02))
            Line((REDONDEO2_R, REDONDEO2_R * 0.02), (REDONDEO2_R, 0))
        make_face()
    redondeo2_piece_16a = extrude(amount=25.8, mode=Mode.PRIVATE)
    redondeo2_piece_16a = split(redondeo2_piece_16a, bisect_by=Plane(origin=(6.773604886, -33.3, 0.226395114), z_dir=(0, -1, 0)), keep=Keep.TOP, mode=Mode.PRIVATE)
    with BuildSketch(Plane(origin=(7, -33.3, -2.5), x_dir=(-1, 0, 0), z_dir=(0, 0, 1))) as redondeo2_piece_16b_section:
        with BuildLine():
            CenterArc((REDONDEO2_R, -REDONDEO2_R), REDONDEO2_R, 90, 90)
            Line((0, -REDONDEO2_R), (-REDONDEO2_R * 0.02, -REDONDEO2_R))
            Line((-REDONDEO2_R * 0.02, -REDONDEO2_R), (-REDONDEO2_R * 0.02, REDONDEO2_R * 0.02))
            Line((-REDONDEO2_R * 0.02, REDONDEO2_R * 0.02), (REDONDEO2_R, REDONDEO2_R * 0.02))
            Line((REDONDEO2_R, REDONDEO2_R * 0.02), (REDONDEO2_R, 0))
        make_face()
    redondeo2_piece_16b = extrude(amount=5.5, mode=Mode.PRIVATE)
    redondeo2_piece_16b = split(redondeo2_piece_16b, bisect_by=Plane(origin=(6.773604886, -33.073604886, 0), z_dir=(0, 0, -1)), keep=Keep.TOP, mode=Mode.PRIVATE)
    redondeo2_piece_16 = redondeo2_piece_16a & redondeo2_piece_16b
    add(redondeo2_piece_16, mode=Mode.SUBTRACT)
    with BuildSketch(Plane(origin=(0, -33.3, -9.5), x_dir=(0, 1, 0), z_dir=(0, 0, 1))) as redondeo2_piece_17a_section:
        with BuildLine():
            CenterArc((REDONDEO2_R, REDONDEO2_R), REDONDEO2_R, 180, 90)
            Line((0, REDONDEO2_R), (-REDONDEO2_R * 0.02, REDONDEO2_R))
            Line((-REDONDEO2_R * 0.02, REDONDEO2_R), (-REDONDEO2_R * 0.02, -REDONDEO2_R * 0.02))
            Line((-REDONDEO2_R * 0.02, -REDONDEO2_R * 0.02), (REDONDEO2_R, -REDONDEO2_R * 0.02))
            Line((REDONDEO2_R, -REDONDEO2_R * 0.02), (REDONDEO2_R, 0))
        make_face()
    redondeo2_piece_17a = extrude(amount=9.5, mode=Mode.PRIVATE)
    redondeo2_piece_17a = split(redondeo2_piece_17a, bisect_by=Plane(origin=(-0.226395114, -33.073604886, -7), z_dir=(0, 0, -1)), keep=Keep.TOP, mode=Mode.PRIVATE)
    with BuildSketch(Plane(origin=(0, -10, -7), x_dir=(0, 0, 1), z_dir=(0, -1, 0))) as redondeo2_piece_17b_section:
        with BuildLine():
            CenterArc((REDONDEO2_R, REDONDEO2_R), REDONDEO2_R, 180, 90)
            Line((0, REDONDEO2_R), (-REDONDEO2_R * 0.02, REDONDEO2_R))
            Line((-REDONDEO2_R * 0.02, REDONDEO2_R), (-REDONDEO2_R * 0.02, -REDONDEO2_R * 0.02))
            Line((-REDONDEO2_R * 0.02, -REDONDEO2_R * 0.02), (REDONDEO2_R, -REDONDEO2_R * 0.02))
            Line((REDONDEO2_R, -REDONDEO2_R * 0.02), (REDONDEO2_R, 0))
        make_face()
    redondeo2_piece_17b = extrude(amount=25.8, mode=Mode.PRIVATE)
    redondeo2_piece_17b = split(redondeo2_piece_17b, bisect_by=Plane(origin=(-0.226395114, -33.3, -6.773604886), z_dir=(0, -1, 0)), keep=Keep.TOP, mode=Mode.PRIVATE)
    redondeo2_piece_17 = redondeo2_piece_17a & redondeo2_piece_17b
    add(redondeo2_piece_17, mode=Mode.SUBTRACT)
    with BuildSketch(Plane(origin=(0, -10, 0), x_dir=(-1, 0, 0), z_dir=(0, 0, -1))) as redondeo2_piece_18a_section:
        with BuildLine():
            CenterArc((REDONDEO2_R, -REDONDEO2_R), REDONDEO2_R, 90, 90)
            Line((0, -REDONDEO2_R), (-REDONDEO2_R * 0.02, -REDONDEO2_R))
            Line((-REDONDEO2_R * 0.02, -REDONDEO2_R), (-REDONDEO2_R * 0.02, REDONDEO2_R * 0.02))
            Line((-REDONDEO2_R * 0.02, REDONDEO2_R * 0.02), (REDONDEO2_R, REDONDEO2_R * 0.02))
            Line((REDONDEO2_R, REDONDEO2_R * 0.02), (REDONDEO2_R, 0))
        make_face()
    redondeo2_piece_18a = extrude(amount=9.5, mode=Mode.PRIVATE)
    redondeo2_piece_18a = split(redondeo2_piece_18a, bisect_by=Plane(origin=(-0.226395114, -10.226395114, -7), z_dir=(0, 0, -1)), keep=Keep.TOP, mode=Mode.PRIVATE)
    with BuildSketch(Plane(origin=(0, -7.5, -7), x_dir=(0, 0, 1), z_dir=(0, -1, 0))) as redondeo2_piece_18b_section:
        with BuildLine():
            CenterArc((REDONDEO2_R, REDONDEO2_R), REDONDEO2_R, 180, 90)
            Line((0, REDONDEO2_R), (-REDONDEO2_R * 0.02, REDONDEO2_R))
            Line((-REDONDEO2_R * 0.02, REDONDEO2_R), (-REDONDEO2_R * 0.02, -REDONDEO2_R * 0.02))
            Line((-REDONDEO2_R * 0.02, -REDONDEO2_R * 0.02), (REDONDEO2_R, -REDONDEO2_R * 0.02))
            Line((REDONDEO2_R, -REDONDEO2_R * 0.02), (REDONDEO2_R, 0))
        make_face()
    redondeo2_piece_18b = extrude(amount=25.8, mode=Mode.PRIVATE)
    redondeo2_piece_18b = split(redondeo2_piece_18b, bisect_by=Plane(origin=(-0.226395114, -10, -6.773604886), z_dir=(0, 1, 0)), keep=Keep.TOP, mode=Mode.PRIVATE)
    redondeo2_piece_18 = redondeo2_piece_18a & redondeo2_piece_18b
    add(redondeo2_piece_18, mode=Mode.SUBTRACT)
    with BuildSketch(Plane(origin=(21, -10, 0), x_dir=(0, 1, 0), z_dir=(-1, 0, 0))) as redondeo2_piece_19a_section:
        with BuildLine():
            CenterArc((REDONDEO2_R, -REDONDEO2_R), REDONDEO2_R, 90, 90)
            Line((0, -REDONDEO2_R), (-REDONDEO2_R * 0.02, -REDONDEO2_R))
            Line((-REDONDEO2_R * 0.02, -REDONDEO2_R), (-REDONDEO2_R * 0.02, REDONDEO2_R * 0.02))
            Line((-REDONDEO2_R * 0.02, REDONDEO2_R * 0.02), (REDONDEO2_R, REDONDEO2_R * 0.02))
            Line((REDONDEO2_R, REDONDEO2_R * 0.02), (REDONDEO2_R, 0))
        make_face()
    redondeo2_piece_19a = extrude(amount=16.5, mode=Mode.PRIVATE)
    redondeo2_piece_19a = split(redondeo2_piece_19a, bisect_by=Plane(origin=(7, -9.773604886, 0.226395114), z_dir=(-1, 0, 0)), keep=Keep.TOP, mode=Mode.PRIVATE)
    with BuildSketch(Plane(origin=(7, -7.5, 0), x_dir=(-1, 0, 0), z_dir=(0, -1, 0))) as redondeo2_piece_19b_section:
        with BuildLine():
            CenterArc((REDONDEO2_R, -REDONDEO2_R), REDONDEO2_R, 90, 90)
            Line((0, -REDONDEO2_R), (-REDONDEO2_R * 0.02, -REDONDEO2_R))
            Line((-REDONDEO2_R * 0.02, -REDONDEO2_R), (-REDONDEO2_R * 0.02, REDONDEO2_R * 0.02))
            Line((-REDONDEO2_R * 0.02, REDONDEO2_R * 0.02), (REDONDEO2_R, REDONDEO2_R * 0.02))
            Line((REDONDEO2_R, REDONDEO2_R * 0.02), (REDONDEO2_R, 0))
        make_face()
    redondeo2_piece_19b = extrude(amount=25.8, mode=Mode.PRIVATE)
    redondeo2_piece_19b = split(redondeo2_piece_19b, bisect_by=Plane(origin=(6.773604886, -10, 0.226395114), z_dir=(0, 1, 0)), keep=Keep.TOP, mode=Mode.PRIVATE)
    redondeo2_piece_19 = redondeo2_piece_19a & redondeo2_piece_19b
    add(redondeo2_piece_19, mode=Mode.SUBTRACT)
    with BuildSketch(Plane(origin=(24, 12.5, 0), x_dir=(-1, 0, 0), z_dir=(0, -1, 0))) as redondeo2_piece_20a_section:
        with BuildLine():
            CenterArc((REDONDEO2_R, -REDONDEO2_R), REDONDEO2_R, 90, 90)
            Line((0, -REDONDEO2_R), (-REDONDEO2_R * 0.02, -REDONDEO2_R))
            Line((-REDONDEO2_R * 0.02, -REDONDEO2_R), (-REDONDEO2_R * 0.02, REDONDEO2_R * 0.02))
            Line((-REDONDEO2_R * 0.02, REDONDEO2_R * 0.02), (REDONDEO2_R, REDONDEO2_R * 0.02))
            Line((REDONDEO2_R, REDONDEO2_R * 0.02), (REDONDEO2_R, 0))
        make_face()
    redondeo2_piece_20a = extrude(amount=32.5, mode=Mode.PRIVATE)
    redondeo2_piece_20a = split(redondeo2_piece_20a, bisect_by=Plane(origin=(23.773604886, 10, 0.226395114), z_dir=(0, 1, 0)), keep=Keep.TOP, mode=Mode.PRIVATE)
    with BuildSketch(Plane(origin=(24, 10, -2.5), x_dir=(-1, 0, 0), z_dir=(0, 0, 1))) as redondeo2_piece_20b_section:
        with BuildLine():
            CenterArc((REDONDEO2_R, REDONDEO2_R), REDONDEO2_R, 180, 90)
            Line((0, REDONDEO2_R), (-REDONDEO2_R * 0.02, REDONDEO2_R))
            Line((-REDONDEO2_R * 0.02, REDONDEO2_R), (-REDONDEO2_R * 0.02, -REDONDEO2_R * 0.02))
            Line((-REDONDEO2_R * 0.02, -REDONDEO2_R * 0.02), (REDONDEO2_R, -REDONDEO2_R * 0.02))
            Line((REDONDEO2_R, -REDONDEO2_R * 0.02), (REDONDEO2_R, 0))
        make_face()
    redondeo2_piece_20b = extrude(amount=25.5, mode=Mode.PRIVATE)
    redondeo2_piece_20b = split(redondeo2_piece_20b, bisect_by=Plane(origin=(23.773604886, 9.773604886, 0), z_dir=(0, 0, -1)), keep=Keep.TOP, mode=Mode.PRIVATE)
    redondeo2_piece_20 = redondeo2_piece_20a & redondeo2_piece_20b
    add(redondeo2_piece_20, mode=Mode.SUBTRACT)
    with BuildSketch(Plane(origin=(24, 10, 0), x_dir=(-1, 0, 0), z_dir=(0, 0, 1))) as redondeo2_piece_21a_section:
        with BuildLine():
            CenterArc((REDONDEO2_R, REDONDEO2_R), REDONDEO2_R, 180, 90)
            Line((0, REDONDEO2_R), (-REDONDEO2_R * 0.02, REDONDEO2_R))
            Line((-REDONDEO2_R * 0.02, REDONDEO2_R), (-REDONDEO2_R * 0.02, -REDONDEO2_R * 0.02))
            Line((-REDONDEO2_R * 0.02, -REDONDEO2_R * 0.02), (REDONDEO2_R, -REDONDEO2_R * 0.02))
            Line((REDONDEO2_R, -REDONDEO2_R * 0.02), (REDONDEO2_R, 0))
        make_face()
    redondeo2_piece_21a = extrude(amount=25.5, mode=Mode.PRIVATE)
    redondeo2_piece_21a = split(redondeo2_piece_21a, bisect_by=Plane(origin=(23.773604886, 9.773604886, 23), z_dir=(0, 0, 1)), keep=Keep.TOP, mode=Mode.PRIVATE)
    with BuildSketch(Plane(origin=(24, 12.5, 23), x_dir=(0, 0, -1), z_dir=(0, -1, 0))) as redondeo2_piece_21b_section:
        with BuildLine():
            CenterArc((REDONDEO2_R, -REDONDEO2_R), REDONDEO2_R, 90, 90)
            Line((0, -REDONDEO2_R), (-REDONDEO2_R * 0.02, -REDONDEO2_R))
            Line((-REDONDEO2_R * 0.02, -REDONDEO2_R), (-REDONDEO2_R * 0.02, REDONDEO2_R * 0.02))
            Line((-REDONDEO2_R * 0.02, REDONDEO2_R * 0.02), (REDONDEO2_R, REDONDEO2_R * 0.02))
            Line((REDONDEO2_R, REDONDEO2_R * 0.02), (REDONDEO2_R, 0))
        make_face()
    redondeo2_piece_21b = extrude(amount=32.5, mode=Mode.PRIVATE)
    redondeo2_piece_21b = split(redondeo2_piece_21b, bisect_by=Plane(origin=(23.773604886, 10, 22.773604886), z_dir=(0, 1, 0)), keep=Keep.TOP, mode=Mode.PRIVATE)
    redondeo2_piece_21 = redondeo2_piece_21a & redondeo2_piece_21b
    add(redondeo2_piece_21, mode=Mode.SUBTRACT)
    with BuildSketch(Plane(origin=(24, 10, 0), x_dir=(-1, 0, 0), z_dir=(0, -1, 0))) as redondeo2_piece_22a_section:
        with BuildLine():
            CenterArc((REDONDEO2_R, -REDONDEO2_R), REDONDEO2_R, 90, 90)
            Line((0, -REDONDEO2_R), (-REDONDEO2_R * 0.02, -REDONDEO2_R))
            Line((-REDONDEO2_R * 0.02, -REDONDEO2_R), (-REDONDEO2_R * 0.02, REDONDEO2_R * 0.02))
            Line((-REDONDEO2_R * 0.02, REDONDEO2_R * 0.02), (REDONDEO2_R, REDONDEO2_R * 0.02))
            Line((REDONDEO2_R, REDONDEO2_R * 0.02), (REDONDEO2_R, 0))
        make_face()
    redondeo2_piece_22a = extrude(amount=32.5, mode=Mode.PRIVATE)
    redondeo2_piece_22a = split(redondeo2_piece_22a, bisect_by=Plane(origin=(23.773604886, -20, 0.226395114), z_dir=(0, -1, 0)), keep=Keep.TOP, mode=Mode.PRIVATE)
    with BuildSketch(Plane(origin=(24, -20, -2.5), x_dir=(-1, 0, 0), z_dir=(0, 0, 1))) as redondeo2_piece_22b_section:
        with BuildLine():
            CenterArc((REDONDEO2_R, -REDONDEO2_R), REDONDEO2_R, 90, 90)
            Line((0, -REDONDEO2_R), (-REDONDEO2_R * 0.02, -REDONDEO2_R))
            Line((-REDONDEO2_R * 0.02, -REDONDEO2_R), (-REDONDEO2_R * 0.02, REDONDEO2_R * 0.02))
            Line((-REDONDEO2_R * 0.02, REDONDEO2_R * 0.02), (REDONDEO2_R, REDONDEO2_R * 0.02))
            Line((REDONDEO2_R, REDONDEO2_R * 0.02), (REDONDEO2_R, 0))
        make_face()
    redondeo2_piece_22b = extrude(amount=25.5, mode=Mode.PRIVATE)
    redondeo2_piece_22b = split(redondeo2_piece_22b, bisect_by=Plane(origin=(23.773604886, -19.773604886, 0), z_dir=(0, 0, -1)), keep=Keep.TOP, mode=Mode.PRIVATE)
    redondeo2_piece_22 = redondeo2_piece_22a & redondeo2_piece_22b
    add(redondeo2_piece_22, mode=Mode.SUBTRACT)
    with BuildSketch(Plane(origin=(24, -20, 0), x_dir=(-1, 0, 0), z_dir=(0, 0, 1))) as redondeo2_piece_23a_section:
        with BuildLine():
            CenterArc((REDONDEO2_R, -REDONDEO2_R), REDONDEO2_R, 90, 90)
            Line((0, -REDONDEO2_R), (-REDONDEO2_R * 0.02, -REDONDEO2_R))
            Line((-REDONDEO2_R * 0.02, -REDONDEO2_R), (-REDONDEO2_R * 0.02, REDONDEO2_R * 0.02))
            Line((-REDONDEO2_R * 0.02, REDONDEO2_R * 0.02), (REDONDEO2_R, REDONDEO2_R * 0.02))
            Line((REDONDEO2_R, REDONDEO2_R * 0.02), (REDONDEO2_R, 0))
        make_face()
    redondeo2_piece_23a = extrude(amount=25.5, mode=Mode.PRIVATE)
    redondeo2_piece_23a = split(redondeo2_piece_23a, bisect_by=Plane(origin=(23.773604886, -19.773604886, 23), z_dir=(0, 0, 1)), keep=Keep.TOP, mode=Mode.PRIVATE)
    with BuildSketch(Plane(origin=(24, 10, 23), x_dir=(0, 0, -1), z_dir=(0, -1, 0))) as redondeo2_piece_23b_section:
        with BuildLine():
            CenterArc((REDONDEO2_R, -REDONDEO2_R), REDONDEO2_R, 90, 90)
            Line((0, -REDONDEO2_R), (-REDONDEO2_R * 0.02, -REDONDEO2_R))
            Line((-REDONDEO2_R * 0.02, -REDONDEO2_R), (-REDONDEO2_R * 0.02, REDONDEO2_R * 0.02))
            Line((-REDONDEO2_R * 0.02, REDONDEO2_R * 0.02), (REDONDEO2_R, REDONDEO2_R * 0.02))
            Line((REDONDEO2_R, REDONDEO2_R * 0.02), (REDONDEO2_R, 0))
        make_face()
    redondeo2_piece_23b = extrude(amount=32.5, mode=Mode.PRIVATE)
    redondeo2_piece_23b = split(redondeo2_piece_23b, bisect_by=Plane(origin=(23.773604886, -20, 22.773604886), z_dir=(0, -1, 0)), keep=Keep.TOP, mode=Mode.PRIVATE)
    redondeo2_piece_23 = redondeo2_piece_23a & redondeo2_piece_23b
    add(redondeo2_piece_23, mode=Mode.SUBTRACT)

    # Croquis18 → Cortar-Extruir10 (cut, through all)
    with BuildSketch(Plane(origin=(0, -44.3, 0), x_dir=(-1, 0, 0), z_dir=(0, -1, 0))):
        with Locations((-10.5, -20.75)):
            Rectangle(CROQUIS18_W, CROQUIS18_H)
    extrude(amount=-CORTAR_EXTRUIR10_DEPTH, mode=Mode.SUBTRACT)


solid = part_1.part
